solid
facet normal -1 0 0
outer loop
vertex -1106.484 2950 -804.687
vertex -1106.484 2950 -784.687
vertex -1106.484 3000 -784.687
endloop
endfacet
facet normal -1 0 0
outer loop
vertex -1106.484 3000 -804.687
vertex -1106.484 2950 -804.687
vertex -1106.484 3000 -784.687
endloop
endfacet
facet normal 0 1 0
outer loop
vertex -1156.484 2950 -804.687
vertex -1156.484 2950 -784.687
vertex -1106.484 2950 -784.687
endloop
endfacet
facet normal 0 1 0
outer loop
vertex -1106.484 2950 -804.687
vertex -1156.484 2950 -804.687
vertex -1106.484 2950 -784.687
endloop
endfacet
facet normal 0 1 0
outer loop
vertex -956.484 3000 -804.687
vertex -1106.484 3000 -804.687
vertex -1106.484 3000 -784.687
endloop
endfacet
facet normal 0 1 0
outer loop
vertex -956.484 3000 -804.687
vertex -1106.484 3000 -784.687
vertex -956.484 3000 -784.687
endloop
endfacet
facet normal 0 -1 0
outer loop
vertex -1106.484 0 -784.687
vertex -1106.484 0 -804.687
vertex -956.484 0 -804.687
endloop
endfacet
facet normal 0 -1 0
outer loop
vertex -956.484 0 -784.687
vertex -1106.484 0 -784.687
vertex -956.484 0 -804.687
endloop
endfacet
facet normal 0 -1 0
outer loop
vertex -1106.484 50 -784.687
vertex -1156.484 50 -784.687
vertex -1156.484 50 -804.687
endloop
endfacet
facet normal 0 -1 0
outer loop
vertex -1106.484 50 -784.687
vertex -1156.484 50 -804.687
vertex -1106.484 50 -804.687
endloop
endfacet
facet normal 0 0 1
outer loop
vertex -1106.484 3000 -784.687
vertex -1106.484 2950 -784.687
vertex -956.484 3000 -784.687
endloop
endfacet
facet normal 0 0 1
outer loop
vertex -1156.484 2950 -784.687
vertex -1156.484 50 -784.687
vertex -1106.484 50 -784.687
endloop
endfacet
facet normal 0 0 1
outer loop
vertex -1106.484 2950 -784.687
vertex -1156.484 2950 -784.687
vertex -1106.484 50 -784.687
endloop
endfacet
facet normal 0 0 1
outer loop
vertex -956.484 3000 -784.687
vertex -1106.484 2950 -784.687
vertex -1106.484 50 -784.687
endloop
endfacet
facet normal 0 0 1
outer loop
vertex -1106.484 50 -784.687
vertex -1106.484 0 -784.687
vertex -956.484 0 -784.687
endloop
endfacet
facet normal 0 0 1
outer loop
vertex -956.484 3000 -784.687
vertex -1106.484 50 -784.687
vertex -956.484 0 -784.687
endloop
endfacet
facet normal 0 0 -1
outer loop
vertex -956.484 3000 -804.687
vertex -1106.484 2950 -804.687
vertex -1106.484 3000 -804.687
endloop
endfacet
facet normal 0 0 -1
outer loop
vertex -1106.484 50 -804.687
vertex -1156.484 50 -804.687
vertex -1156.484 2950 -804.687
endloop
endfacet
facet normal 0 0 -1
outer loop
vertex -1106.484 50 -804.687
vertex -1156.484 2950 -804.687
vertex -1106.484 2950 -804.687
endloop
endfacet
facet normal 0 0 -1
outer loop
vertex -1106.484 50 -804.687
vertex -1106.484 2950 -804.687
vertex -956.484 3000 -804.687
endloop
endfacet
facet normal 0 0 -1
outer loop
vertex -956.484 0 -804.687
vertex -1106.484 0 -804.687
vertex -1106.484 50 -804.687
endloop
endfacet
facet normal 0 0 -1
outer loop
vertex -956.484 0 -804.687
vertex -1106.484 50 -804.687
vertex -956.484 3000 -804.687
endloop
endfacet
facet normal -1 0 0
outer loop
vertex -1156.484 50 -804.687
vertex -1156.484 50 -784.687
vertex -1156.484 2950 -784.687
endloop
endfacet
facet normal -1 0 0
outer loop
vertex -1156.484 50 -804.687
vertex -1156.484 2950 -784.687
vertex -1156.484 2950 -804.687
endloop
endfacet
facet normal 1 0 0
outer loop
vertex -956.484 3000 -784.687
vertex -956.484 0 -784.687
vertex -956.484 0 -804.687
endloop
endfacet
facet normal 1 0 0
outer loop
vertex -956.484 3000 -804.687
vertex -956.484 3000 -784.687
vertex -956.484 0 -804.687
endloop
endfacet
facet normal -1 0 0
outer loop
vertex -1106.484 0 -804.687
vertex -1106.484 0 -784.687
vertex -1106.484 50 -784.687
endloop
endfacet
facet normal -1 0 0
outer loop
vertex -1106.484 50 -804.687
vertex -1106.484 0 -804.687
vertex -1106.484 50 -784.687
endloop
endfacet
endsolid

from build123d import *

# Parameters (mm, degrees)
ESBO_O1_W                = 200
ESBO_O1_H                = 20
RESSALTO_EXTRUS_O1_DEPTH = 3000
ESBO_O2_W                = 50
ESBO_O2_H                = 50
CORTE_EXTRUS_O1_DEPTH    = 21
ESBO_O3_W                = 50
ESBO_O3_H                = 50
CORTE_EXTRUS_O2_DEPTH    = 21


with BuildPart() as part:
    # Esboço1 → Ressalto-extrusão1 (new body)
    with BuildSketch(Plane(origin=(0, 0, 0), x_dir=(1, 0, 0), z_dir=(0, 1, 0))):
        with Locations((-1056.483688544, 794.687242443)):
            Rectangle(ESBO_O1_W, ESBO_O1_H)
    extrude(amount=RESSALTO_EXTRUS_O1_DEPTH)

    # Esboço2 → Corte-extrusão1 (cut, through all)
    with BuildSketch(Plane.XY.offset(-784.687242443)):
        with Locations((-1131.483688544, 25)):
            Rectangle(ESBO_O2_W, ESBO_O2_H)
    extrude(amount=-CORTE_EXTRUS_O1_DEPTH, mode=Mode.SUBTRACT)

    # Esboço3 → Corte-extrusão2 (cut, through all)
    with BuildSketch(Plane.XY.offset(-784.687242443)):
        with Locations((-1131.483688544, 2975)):
            Rectangle(ESBO_O3_W, ESBO_O3_H)
    extrude(amount=-CORTE_EXTRUS_O2_DEPTH, mode=Mode.SUBTRACT)


solid = part.part
